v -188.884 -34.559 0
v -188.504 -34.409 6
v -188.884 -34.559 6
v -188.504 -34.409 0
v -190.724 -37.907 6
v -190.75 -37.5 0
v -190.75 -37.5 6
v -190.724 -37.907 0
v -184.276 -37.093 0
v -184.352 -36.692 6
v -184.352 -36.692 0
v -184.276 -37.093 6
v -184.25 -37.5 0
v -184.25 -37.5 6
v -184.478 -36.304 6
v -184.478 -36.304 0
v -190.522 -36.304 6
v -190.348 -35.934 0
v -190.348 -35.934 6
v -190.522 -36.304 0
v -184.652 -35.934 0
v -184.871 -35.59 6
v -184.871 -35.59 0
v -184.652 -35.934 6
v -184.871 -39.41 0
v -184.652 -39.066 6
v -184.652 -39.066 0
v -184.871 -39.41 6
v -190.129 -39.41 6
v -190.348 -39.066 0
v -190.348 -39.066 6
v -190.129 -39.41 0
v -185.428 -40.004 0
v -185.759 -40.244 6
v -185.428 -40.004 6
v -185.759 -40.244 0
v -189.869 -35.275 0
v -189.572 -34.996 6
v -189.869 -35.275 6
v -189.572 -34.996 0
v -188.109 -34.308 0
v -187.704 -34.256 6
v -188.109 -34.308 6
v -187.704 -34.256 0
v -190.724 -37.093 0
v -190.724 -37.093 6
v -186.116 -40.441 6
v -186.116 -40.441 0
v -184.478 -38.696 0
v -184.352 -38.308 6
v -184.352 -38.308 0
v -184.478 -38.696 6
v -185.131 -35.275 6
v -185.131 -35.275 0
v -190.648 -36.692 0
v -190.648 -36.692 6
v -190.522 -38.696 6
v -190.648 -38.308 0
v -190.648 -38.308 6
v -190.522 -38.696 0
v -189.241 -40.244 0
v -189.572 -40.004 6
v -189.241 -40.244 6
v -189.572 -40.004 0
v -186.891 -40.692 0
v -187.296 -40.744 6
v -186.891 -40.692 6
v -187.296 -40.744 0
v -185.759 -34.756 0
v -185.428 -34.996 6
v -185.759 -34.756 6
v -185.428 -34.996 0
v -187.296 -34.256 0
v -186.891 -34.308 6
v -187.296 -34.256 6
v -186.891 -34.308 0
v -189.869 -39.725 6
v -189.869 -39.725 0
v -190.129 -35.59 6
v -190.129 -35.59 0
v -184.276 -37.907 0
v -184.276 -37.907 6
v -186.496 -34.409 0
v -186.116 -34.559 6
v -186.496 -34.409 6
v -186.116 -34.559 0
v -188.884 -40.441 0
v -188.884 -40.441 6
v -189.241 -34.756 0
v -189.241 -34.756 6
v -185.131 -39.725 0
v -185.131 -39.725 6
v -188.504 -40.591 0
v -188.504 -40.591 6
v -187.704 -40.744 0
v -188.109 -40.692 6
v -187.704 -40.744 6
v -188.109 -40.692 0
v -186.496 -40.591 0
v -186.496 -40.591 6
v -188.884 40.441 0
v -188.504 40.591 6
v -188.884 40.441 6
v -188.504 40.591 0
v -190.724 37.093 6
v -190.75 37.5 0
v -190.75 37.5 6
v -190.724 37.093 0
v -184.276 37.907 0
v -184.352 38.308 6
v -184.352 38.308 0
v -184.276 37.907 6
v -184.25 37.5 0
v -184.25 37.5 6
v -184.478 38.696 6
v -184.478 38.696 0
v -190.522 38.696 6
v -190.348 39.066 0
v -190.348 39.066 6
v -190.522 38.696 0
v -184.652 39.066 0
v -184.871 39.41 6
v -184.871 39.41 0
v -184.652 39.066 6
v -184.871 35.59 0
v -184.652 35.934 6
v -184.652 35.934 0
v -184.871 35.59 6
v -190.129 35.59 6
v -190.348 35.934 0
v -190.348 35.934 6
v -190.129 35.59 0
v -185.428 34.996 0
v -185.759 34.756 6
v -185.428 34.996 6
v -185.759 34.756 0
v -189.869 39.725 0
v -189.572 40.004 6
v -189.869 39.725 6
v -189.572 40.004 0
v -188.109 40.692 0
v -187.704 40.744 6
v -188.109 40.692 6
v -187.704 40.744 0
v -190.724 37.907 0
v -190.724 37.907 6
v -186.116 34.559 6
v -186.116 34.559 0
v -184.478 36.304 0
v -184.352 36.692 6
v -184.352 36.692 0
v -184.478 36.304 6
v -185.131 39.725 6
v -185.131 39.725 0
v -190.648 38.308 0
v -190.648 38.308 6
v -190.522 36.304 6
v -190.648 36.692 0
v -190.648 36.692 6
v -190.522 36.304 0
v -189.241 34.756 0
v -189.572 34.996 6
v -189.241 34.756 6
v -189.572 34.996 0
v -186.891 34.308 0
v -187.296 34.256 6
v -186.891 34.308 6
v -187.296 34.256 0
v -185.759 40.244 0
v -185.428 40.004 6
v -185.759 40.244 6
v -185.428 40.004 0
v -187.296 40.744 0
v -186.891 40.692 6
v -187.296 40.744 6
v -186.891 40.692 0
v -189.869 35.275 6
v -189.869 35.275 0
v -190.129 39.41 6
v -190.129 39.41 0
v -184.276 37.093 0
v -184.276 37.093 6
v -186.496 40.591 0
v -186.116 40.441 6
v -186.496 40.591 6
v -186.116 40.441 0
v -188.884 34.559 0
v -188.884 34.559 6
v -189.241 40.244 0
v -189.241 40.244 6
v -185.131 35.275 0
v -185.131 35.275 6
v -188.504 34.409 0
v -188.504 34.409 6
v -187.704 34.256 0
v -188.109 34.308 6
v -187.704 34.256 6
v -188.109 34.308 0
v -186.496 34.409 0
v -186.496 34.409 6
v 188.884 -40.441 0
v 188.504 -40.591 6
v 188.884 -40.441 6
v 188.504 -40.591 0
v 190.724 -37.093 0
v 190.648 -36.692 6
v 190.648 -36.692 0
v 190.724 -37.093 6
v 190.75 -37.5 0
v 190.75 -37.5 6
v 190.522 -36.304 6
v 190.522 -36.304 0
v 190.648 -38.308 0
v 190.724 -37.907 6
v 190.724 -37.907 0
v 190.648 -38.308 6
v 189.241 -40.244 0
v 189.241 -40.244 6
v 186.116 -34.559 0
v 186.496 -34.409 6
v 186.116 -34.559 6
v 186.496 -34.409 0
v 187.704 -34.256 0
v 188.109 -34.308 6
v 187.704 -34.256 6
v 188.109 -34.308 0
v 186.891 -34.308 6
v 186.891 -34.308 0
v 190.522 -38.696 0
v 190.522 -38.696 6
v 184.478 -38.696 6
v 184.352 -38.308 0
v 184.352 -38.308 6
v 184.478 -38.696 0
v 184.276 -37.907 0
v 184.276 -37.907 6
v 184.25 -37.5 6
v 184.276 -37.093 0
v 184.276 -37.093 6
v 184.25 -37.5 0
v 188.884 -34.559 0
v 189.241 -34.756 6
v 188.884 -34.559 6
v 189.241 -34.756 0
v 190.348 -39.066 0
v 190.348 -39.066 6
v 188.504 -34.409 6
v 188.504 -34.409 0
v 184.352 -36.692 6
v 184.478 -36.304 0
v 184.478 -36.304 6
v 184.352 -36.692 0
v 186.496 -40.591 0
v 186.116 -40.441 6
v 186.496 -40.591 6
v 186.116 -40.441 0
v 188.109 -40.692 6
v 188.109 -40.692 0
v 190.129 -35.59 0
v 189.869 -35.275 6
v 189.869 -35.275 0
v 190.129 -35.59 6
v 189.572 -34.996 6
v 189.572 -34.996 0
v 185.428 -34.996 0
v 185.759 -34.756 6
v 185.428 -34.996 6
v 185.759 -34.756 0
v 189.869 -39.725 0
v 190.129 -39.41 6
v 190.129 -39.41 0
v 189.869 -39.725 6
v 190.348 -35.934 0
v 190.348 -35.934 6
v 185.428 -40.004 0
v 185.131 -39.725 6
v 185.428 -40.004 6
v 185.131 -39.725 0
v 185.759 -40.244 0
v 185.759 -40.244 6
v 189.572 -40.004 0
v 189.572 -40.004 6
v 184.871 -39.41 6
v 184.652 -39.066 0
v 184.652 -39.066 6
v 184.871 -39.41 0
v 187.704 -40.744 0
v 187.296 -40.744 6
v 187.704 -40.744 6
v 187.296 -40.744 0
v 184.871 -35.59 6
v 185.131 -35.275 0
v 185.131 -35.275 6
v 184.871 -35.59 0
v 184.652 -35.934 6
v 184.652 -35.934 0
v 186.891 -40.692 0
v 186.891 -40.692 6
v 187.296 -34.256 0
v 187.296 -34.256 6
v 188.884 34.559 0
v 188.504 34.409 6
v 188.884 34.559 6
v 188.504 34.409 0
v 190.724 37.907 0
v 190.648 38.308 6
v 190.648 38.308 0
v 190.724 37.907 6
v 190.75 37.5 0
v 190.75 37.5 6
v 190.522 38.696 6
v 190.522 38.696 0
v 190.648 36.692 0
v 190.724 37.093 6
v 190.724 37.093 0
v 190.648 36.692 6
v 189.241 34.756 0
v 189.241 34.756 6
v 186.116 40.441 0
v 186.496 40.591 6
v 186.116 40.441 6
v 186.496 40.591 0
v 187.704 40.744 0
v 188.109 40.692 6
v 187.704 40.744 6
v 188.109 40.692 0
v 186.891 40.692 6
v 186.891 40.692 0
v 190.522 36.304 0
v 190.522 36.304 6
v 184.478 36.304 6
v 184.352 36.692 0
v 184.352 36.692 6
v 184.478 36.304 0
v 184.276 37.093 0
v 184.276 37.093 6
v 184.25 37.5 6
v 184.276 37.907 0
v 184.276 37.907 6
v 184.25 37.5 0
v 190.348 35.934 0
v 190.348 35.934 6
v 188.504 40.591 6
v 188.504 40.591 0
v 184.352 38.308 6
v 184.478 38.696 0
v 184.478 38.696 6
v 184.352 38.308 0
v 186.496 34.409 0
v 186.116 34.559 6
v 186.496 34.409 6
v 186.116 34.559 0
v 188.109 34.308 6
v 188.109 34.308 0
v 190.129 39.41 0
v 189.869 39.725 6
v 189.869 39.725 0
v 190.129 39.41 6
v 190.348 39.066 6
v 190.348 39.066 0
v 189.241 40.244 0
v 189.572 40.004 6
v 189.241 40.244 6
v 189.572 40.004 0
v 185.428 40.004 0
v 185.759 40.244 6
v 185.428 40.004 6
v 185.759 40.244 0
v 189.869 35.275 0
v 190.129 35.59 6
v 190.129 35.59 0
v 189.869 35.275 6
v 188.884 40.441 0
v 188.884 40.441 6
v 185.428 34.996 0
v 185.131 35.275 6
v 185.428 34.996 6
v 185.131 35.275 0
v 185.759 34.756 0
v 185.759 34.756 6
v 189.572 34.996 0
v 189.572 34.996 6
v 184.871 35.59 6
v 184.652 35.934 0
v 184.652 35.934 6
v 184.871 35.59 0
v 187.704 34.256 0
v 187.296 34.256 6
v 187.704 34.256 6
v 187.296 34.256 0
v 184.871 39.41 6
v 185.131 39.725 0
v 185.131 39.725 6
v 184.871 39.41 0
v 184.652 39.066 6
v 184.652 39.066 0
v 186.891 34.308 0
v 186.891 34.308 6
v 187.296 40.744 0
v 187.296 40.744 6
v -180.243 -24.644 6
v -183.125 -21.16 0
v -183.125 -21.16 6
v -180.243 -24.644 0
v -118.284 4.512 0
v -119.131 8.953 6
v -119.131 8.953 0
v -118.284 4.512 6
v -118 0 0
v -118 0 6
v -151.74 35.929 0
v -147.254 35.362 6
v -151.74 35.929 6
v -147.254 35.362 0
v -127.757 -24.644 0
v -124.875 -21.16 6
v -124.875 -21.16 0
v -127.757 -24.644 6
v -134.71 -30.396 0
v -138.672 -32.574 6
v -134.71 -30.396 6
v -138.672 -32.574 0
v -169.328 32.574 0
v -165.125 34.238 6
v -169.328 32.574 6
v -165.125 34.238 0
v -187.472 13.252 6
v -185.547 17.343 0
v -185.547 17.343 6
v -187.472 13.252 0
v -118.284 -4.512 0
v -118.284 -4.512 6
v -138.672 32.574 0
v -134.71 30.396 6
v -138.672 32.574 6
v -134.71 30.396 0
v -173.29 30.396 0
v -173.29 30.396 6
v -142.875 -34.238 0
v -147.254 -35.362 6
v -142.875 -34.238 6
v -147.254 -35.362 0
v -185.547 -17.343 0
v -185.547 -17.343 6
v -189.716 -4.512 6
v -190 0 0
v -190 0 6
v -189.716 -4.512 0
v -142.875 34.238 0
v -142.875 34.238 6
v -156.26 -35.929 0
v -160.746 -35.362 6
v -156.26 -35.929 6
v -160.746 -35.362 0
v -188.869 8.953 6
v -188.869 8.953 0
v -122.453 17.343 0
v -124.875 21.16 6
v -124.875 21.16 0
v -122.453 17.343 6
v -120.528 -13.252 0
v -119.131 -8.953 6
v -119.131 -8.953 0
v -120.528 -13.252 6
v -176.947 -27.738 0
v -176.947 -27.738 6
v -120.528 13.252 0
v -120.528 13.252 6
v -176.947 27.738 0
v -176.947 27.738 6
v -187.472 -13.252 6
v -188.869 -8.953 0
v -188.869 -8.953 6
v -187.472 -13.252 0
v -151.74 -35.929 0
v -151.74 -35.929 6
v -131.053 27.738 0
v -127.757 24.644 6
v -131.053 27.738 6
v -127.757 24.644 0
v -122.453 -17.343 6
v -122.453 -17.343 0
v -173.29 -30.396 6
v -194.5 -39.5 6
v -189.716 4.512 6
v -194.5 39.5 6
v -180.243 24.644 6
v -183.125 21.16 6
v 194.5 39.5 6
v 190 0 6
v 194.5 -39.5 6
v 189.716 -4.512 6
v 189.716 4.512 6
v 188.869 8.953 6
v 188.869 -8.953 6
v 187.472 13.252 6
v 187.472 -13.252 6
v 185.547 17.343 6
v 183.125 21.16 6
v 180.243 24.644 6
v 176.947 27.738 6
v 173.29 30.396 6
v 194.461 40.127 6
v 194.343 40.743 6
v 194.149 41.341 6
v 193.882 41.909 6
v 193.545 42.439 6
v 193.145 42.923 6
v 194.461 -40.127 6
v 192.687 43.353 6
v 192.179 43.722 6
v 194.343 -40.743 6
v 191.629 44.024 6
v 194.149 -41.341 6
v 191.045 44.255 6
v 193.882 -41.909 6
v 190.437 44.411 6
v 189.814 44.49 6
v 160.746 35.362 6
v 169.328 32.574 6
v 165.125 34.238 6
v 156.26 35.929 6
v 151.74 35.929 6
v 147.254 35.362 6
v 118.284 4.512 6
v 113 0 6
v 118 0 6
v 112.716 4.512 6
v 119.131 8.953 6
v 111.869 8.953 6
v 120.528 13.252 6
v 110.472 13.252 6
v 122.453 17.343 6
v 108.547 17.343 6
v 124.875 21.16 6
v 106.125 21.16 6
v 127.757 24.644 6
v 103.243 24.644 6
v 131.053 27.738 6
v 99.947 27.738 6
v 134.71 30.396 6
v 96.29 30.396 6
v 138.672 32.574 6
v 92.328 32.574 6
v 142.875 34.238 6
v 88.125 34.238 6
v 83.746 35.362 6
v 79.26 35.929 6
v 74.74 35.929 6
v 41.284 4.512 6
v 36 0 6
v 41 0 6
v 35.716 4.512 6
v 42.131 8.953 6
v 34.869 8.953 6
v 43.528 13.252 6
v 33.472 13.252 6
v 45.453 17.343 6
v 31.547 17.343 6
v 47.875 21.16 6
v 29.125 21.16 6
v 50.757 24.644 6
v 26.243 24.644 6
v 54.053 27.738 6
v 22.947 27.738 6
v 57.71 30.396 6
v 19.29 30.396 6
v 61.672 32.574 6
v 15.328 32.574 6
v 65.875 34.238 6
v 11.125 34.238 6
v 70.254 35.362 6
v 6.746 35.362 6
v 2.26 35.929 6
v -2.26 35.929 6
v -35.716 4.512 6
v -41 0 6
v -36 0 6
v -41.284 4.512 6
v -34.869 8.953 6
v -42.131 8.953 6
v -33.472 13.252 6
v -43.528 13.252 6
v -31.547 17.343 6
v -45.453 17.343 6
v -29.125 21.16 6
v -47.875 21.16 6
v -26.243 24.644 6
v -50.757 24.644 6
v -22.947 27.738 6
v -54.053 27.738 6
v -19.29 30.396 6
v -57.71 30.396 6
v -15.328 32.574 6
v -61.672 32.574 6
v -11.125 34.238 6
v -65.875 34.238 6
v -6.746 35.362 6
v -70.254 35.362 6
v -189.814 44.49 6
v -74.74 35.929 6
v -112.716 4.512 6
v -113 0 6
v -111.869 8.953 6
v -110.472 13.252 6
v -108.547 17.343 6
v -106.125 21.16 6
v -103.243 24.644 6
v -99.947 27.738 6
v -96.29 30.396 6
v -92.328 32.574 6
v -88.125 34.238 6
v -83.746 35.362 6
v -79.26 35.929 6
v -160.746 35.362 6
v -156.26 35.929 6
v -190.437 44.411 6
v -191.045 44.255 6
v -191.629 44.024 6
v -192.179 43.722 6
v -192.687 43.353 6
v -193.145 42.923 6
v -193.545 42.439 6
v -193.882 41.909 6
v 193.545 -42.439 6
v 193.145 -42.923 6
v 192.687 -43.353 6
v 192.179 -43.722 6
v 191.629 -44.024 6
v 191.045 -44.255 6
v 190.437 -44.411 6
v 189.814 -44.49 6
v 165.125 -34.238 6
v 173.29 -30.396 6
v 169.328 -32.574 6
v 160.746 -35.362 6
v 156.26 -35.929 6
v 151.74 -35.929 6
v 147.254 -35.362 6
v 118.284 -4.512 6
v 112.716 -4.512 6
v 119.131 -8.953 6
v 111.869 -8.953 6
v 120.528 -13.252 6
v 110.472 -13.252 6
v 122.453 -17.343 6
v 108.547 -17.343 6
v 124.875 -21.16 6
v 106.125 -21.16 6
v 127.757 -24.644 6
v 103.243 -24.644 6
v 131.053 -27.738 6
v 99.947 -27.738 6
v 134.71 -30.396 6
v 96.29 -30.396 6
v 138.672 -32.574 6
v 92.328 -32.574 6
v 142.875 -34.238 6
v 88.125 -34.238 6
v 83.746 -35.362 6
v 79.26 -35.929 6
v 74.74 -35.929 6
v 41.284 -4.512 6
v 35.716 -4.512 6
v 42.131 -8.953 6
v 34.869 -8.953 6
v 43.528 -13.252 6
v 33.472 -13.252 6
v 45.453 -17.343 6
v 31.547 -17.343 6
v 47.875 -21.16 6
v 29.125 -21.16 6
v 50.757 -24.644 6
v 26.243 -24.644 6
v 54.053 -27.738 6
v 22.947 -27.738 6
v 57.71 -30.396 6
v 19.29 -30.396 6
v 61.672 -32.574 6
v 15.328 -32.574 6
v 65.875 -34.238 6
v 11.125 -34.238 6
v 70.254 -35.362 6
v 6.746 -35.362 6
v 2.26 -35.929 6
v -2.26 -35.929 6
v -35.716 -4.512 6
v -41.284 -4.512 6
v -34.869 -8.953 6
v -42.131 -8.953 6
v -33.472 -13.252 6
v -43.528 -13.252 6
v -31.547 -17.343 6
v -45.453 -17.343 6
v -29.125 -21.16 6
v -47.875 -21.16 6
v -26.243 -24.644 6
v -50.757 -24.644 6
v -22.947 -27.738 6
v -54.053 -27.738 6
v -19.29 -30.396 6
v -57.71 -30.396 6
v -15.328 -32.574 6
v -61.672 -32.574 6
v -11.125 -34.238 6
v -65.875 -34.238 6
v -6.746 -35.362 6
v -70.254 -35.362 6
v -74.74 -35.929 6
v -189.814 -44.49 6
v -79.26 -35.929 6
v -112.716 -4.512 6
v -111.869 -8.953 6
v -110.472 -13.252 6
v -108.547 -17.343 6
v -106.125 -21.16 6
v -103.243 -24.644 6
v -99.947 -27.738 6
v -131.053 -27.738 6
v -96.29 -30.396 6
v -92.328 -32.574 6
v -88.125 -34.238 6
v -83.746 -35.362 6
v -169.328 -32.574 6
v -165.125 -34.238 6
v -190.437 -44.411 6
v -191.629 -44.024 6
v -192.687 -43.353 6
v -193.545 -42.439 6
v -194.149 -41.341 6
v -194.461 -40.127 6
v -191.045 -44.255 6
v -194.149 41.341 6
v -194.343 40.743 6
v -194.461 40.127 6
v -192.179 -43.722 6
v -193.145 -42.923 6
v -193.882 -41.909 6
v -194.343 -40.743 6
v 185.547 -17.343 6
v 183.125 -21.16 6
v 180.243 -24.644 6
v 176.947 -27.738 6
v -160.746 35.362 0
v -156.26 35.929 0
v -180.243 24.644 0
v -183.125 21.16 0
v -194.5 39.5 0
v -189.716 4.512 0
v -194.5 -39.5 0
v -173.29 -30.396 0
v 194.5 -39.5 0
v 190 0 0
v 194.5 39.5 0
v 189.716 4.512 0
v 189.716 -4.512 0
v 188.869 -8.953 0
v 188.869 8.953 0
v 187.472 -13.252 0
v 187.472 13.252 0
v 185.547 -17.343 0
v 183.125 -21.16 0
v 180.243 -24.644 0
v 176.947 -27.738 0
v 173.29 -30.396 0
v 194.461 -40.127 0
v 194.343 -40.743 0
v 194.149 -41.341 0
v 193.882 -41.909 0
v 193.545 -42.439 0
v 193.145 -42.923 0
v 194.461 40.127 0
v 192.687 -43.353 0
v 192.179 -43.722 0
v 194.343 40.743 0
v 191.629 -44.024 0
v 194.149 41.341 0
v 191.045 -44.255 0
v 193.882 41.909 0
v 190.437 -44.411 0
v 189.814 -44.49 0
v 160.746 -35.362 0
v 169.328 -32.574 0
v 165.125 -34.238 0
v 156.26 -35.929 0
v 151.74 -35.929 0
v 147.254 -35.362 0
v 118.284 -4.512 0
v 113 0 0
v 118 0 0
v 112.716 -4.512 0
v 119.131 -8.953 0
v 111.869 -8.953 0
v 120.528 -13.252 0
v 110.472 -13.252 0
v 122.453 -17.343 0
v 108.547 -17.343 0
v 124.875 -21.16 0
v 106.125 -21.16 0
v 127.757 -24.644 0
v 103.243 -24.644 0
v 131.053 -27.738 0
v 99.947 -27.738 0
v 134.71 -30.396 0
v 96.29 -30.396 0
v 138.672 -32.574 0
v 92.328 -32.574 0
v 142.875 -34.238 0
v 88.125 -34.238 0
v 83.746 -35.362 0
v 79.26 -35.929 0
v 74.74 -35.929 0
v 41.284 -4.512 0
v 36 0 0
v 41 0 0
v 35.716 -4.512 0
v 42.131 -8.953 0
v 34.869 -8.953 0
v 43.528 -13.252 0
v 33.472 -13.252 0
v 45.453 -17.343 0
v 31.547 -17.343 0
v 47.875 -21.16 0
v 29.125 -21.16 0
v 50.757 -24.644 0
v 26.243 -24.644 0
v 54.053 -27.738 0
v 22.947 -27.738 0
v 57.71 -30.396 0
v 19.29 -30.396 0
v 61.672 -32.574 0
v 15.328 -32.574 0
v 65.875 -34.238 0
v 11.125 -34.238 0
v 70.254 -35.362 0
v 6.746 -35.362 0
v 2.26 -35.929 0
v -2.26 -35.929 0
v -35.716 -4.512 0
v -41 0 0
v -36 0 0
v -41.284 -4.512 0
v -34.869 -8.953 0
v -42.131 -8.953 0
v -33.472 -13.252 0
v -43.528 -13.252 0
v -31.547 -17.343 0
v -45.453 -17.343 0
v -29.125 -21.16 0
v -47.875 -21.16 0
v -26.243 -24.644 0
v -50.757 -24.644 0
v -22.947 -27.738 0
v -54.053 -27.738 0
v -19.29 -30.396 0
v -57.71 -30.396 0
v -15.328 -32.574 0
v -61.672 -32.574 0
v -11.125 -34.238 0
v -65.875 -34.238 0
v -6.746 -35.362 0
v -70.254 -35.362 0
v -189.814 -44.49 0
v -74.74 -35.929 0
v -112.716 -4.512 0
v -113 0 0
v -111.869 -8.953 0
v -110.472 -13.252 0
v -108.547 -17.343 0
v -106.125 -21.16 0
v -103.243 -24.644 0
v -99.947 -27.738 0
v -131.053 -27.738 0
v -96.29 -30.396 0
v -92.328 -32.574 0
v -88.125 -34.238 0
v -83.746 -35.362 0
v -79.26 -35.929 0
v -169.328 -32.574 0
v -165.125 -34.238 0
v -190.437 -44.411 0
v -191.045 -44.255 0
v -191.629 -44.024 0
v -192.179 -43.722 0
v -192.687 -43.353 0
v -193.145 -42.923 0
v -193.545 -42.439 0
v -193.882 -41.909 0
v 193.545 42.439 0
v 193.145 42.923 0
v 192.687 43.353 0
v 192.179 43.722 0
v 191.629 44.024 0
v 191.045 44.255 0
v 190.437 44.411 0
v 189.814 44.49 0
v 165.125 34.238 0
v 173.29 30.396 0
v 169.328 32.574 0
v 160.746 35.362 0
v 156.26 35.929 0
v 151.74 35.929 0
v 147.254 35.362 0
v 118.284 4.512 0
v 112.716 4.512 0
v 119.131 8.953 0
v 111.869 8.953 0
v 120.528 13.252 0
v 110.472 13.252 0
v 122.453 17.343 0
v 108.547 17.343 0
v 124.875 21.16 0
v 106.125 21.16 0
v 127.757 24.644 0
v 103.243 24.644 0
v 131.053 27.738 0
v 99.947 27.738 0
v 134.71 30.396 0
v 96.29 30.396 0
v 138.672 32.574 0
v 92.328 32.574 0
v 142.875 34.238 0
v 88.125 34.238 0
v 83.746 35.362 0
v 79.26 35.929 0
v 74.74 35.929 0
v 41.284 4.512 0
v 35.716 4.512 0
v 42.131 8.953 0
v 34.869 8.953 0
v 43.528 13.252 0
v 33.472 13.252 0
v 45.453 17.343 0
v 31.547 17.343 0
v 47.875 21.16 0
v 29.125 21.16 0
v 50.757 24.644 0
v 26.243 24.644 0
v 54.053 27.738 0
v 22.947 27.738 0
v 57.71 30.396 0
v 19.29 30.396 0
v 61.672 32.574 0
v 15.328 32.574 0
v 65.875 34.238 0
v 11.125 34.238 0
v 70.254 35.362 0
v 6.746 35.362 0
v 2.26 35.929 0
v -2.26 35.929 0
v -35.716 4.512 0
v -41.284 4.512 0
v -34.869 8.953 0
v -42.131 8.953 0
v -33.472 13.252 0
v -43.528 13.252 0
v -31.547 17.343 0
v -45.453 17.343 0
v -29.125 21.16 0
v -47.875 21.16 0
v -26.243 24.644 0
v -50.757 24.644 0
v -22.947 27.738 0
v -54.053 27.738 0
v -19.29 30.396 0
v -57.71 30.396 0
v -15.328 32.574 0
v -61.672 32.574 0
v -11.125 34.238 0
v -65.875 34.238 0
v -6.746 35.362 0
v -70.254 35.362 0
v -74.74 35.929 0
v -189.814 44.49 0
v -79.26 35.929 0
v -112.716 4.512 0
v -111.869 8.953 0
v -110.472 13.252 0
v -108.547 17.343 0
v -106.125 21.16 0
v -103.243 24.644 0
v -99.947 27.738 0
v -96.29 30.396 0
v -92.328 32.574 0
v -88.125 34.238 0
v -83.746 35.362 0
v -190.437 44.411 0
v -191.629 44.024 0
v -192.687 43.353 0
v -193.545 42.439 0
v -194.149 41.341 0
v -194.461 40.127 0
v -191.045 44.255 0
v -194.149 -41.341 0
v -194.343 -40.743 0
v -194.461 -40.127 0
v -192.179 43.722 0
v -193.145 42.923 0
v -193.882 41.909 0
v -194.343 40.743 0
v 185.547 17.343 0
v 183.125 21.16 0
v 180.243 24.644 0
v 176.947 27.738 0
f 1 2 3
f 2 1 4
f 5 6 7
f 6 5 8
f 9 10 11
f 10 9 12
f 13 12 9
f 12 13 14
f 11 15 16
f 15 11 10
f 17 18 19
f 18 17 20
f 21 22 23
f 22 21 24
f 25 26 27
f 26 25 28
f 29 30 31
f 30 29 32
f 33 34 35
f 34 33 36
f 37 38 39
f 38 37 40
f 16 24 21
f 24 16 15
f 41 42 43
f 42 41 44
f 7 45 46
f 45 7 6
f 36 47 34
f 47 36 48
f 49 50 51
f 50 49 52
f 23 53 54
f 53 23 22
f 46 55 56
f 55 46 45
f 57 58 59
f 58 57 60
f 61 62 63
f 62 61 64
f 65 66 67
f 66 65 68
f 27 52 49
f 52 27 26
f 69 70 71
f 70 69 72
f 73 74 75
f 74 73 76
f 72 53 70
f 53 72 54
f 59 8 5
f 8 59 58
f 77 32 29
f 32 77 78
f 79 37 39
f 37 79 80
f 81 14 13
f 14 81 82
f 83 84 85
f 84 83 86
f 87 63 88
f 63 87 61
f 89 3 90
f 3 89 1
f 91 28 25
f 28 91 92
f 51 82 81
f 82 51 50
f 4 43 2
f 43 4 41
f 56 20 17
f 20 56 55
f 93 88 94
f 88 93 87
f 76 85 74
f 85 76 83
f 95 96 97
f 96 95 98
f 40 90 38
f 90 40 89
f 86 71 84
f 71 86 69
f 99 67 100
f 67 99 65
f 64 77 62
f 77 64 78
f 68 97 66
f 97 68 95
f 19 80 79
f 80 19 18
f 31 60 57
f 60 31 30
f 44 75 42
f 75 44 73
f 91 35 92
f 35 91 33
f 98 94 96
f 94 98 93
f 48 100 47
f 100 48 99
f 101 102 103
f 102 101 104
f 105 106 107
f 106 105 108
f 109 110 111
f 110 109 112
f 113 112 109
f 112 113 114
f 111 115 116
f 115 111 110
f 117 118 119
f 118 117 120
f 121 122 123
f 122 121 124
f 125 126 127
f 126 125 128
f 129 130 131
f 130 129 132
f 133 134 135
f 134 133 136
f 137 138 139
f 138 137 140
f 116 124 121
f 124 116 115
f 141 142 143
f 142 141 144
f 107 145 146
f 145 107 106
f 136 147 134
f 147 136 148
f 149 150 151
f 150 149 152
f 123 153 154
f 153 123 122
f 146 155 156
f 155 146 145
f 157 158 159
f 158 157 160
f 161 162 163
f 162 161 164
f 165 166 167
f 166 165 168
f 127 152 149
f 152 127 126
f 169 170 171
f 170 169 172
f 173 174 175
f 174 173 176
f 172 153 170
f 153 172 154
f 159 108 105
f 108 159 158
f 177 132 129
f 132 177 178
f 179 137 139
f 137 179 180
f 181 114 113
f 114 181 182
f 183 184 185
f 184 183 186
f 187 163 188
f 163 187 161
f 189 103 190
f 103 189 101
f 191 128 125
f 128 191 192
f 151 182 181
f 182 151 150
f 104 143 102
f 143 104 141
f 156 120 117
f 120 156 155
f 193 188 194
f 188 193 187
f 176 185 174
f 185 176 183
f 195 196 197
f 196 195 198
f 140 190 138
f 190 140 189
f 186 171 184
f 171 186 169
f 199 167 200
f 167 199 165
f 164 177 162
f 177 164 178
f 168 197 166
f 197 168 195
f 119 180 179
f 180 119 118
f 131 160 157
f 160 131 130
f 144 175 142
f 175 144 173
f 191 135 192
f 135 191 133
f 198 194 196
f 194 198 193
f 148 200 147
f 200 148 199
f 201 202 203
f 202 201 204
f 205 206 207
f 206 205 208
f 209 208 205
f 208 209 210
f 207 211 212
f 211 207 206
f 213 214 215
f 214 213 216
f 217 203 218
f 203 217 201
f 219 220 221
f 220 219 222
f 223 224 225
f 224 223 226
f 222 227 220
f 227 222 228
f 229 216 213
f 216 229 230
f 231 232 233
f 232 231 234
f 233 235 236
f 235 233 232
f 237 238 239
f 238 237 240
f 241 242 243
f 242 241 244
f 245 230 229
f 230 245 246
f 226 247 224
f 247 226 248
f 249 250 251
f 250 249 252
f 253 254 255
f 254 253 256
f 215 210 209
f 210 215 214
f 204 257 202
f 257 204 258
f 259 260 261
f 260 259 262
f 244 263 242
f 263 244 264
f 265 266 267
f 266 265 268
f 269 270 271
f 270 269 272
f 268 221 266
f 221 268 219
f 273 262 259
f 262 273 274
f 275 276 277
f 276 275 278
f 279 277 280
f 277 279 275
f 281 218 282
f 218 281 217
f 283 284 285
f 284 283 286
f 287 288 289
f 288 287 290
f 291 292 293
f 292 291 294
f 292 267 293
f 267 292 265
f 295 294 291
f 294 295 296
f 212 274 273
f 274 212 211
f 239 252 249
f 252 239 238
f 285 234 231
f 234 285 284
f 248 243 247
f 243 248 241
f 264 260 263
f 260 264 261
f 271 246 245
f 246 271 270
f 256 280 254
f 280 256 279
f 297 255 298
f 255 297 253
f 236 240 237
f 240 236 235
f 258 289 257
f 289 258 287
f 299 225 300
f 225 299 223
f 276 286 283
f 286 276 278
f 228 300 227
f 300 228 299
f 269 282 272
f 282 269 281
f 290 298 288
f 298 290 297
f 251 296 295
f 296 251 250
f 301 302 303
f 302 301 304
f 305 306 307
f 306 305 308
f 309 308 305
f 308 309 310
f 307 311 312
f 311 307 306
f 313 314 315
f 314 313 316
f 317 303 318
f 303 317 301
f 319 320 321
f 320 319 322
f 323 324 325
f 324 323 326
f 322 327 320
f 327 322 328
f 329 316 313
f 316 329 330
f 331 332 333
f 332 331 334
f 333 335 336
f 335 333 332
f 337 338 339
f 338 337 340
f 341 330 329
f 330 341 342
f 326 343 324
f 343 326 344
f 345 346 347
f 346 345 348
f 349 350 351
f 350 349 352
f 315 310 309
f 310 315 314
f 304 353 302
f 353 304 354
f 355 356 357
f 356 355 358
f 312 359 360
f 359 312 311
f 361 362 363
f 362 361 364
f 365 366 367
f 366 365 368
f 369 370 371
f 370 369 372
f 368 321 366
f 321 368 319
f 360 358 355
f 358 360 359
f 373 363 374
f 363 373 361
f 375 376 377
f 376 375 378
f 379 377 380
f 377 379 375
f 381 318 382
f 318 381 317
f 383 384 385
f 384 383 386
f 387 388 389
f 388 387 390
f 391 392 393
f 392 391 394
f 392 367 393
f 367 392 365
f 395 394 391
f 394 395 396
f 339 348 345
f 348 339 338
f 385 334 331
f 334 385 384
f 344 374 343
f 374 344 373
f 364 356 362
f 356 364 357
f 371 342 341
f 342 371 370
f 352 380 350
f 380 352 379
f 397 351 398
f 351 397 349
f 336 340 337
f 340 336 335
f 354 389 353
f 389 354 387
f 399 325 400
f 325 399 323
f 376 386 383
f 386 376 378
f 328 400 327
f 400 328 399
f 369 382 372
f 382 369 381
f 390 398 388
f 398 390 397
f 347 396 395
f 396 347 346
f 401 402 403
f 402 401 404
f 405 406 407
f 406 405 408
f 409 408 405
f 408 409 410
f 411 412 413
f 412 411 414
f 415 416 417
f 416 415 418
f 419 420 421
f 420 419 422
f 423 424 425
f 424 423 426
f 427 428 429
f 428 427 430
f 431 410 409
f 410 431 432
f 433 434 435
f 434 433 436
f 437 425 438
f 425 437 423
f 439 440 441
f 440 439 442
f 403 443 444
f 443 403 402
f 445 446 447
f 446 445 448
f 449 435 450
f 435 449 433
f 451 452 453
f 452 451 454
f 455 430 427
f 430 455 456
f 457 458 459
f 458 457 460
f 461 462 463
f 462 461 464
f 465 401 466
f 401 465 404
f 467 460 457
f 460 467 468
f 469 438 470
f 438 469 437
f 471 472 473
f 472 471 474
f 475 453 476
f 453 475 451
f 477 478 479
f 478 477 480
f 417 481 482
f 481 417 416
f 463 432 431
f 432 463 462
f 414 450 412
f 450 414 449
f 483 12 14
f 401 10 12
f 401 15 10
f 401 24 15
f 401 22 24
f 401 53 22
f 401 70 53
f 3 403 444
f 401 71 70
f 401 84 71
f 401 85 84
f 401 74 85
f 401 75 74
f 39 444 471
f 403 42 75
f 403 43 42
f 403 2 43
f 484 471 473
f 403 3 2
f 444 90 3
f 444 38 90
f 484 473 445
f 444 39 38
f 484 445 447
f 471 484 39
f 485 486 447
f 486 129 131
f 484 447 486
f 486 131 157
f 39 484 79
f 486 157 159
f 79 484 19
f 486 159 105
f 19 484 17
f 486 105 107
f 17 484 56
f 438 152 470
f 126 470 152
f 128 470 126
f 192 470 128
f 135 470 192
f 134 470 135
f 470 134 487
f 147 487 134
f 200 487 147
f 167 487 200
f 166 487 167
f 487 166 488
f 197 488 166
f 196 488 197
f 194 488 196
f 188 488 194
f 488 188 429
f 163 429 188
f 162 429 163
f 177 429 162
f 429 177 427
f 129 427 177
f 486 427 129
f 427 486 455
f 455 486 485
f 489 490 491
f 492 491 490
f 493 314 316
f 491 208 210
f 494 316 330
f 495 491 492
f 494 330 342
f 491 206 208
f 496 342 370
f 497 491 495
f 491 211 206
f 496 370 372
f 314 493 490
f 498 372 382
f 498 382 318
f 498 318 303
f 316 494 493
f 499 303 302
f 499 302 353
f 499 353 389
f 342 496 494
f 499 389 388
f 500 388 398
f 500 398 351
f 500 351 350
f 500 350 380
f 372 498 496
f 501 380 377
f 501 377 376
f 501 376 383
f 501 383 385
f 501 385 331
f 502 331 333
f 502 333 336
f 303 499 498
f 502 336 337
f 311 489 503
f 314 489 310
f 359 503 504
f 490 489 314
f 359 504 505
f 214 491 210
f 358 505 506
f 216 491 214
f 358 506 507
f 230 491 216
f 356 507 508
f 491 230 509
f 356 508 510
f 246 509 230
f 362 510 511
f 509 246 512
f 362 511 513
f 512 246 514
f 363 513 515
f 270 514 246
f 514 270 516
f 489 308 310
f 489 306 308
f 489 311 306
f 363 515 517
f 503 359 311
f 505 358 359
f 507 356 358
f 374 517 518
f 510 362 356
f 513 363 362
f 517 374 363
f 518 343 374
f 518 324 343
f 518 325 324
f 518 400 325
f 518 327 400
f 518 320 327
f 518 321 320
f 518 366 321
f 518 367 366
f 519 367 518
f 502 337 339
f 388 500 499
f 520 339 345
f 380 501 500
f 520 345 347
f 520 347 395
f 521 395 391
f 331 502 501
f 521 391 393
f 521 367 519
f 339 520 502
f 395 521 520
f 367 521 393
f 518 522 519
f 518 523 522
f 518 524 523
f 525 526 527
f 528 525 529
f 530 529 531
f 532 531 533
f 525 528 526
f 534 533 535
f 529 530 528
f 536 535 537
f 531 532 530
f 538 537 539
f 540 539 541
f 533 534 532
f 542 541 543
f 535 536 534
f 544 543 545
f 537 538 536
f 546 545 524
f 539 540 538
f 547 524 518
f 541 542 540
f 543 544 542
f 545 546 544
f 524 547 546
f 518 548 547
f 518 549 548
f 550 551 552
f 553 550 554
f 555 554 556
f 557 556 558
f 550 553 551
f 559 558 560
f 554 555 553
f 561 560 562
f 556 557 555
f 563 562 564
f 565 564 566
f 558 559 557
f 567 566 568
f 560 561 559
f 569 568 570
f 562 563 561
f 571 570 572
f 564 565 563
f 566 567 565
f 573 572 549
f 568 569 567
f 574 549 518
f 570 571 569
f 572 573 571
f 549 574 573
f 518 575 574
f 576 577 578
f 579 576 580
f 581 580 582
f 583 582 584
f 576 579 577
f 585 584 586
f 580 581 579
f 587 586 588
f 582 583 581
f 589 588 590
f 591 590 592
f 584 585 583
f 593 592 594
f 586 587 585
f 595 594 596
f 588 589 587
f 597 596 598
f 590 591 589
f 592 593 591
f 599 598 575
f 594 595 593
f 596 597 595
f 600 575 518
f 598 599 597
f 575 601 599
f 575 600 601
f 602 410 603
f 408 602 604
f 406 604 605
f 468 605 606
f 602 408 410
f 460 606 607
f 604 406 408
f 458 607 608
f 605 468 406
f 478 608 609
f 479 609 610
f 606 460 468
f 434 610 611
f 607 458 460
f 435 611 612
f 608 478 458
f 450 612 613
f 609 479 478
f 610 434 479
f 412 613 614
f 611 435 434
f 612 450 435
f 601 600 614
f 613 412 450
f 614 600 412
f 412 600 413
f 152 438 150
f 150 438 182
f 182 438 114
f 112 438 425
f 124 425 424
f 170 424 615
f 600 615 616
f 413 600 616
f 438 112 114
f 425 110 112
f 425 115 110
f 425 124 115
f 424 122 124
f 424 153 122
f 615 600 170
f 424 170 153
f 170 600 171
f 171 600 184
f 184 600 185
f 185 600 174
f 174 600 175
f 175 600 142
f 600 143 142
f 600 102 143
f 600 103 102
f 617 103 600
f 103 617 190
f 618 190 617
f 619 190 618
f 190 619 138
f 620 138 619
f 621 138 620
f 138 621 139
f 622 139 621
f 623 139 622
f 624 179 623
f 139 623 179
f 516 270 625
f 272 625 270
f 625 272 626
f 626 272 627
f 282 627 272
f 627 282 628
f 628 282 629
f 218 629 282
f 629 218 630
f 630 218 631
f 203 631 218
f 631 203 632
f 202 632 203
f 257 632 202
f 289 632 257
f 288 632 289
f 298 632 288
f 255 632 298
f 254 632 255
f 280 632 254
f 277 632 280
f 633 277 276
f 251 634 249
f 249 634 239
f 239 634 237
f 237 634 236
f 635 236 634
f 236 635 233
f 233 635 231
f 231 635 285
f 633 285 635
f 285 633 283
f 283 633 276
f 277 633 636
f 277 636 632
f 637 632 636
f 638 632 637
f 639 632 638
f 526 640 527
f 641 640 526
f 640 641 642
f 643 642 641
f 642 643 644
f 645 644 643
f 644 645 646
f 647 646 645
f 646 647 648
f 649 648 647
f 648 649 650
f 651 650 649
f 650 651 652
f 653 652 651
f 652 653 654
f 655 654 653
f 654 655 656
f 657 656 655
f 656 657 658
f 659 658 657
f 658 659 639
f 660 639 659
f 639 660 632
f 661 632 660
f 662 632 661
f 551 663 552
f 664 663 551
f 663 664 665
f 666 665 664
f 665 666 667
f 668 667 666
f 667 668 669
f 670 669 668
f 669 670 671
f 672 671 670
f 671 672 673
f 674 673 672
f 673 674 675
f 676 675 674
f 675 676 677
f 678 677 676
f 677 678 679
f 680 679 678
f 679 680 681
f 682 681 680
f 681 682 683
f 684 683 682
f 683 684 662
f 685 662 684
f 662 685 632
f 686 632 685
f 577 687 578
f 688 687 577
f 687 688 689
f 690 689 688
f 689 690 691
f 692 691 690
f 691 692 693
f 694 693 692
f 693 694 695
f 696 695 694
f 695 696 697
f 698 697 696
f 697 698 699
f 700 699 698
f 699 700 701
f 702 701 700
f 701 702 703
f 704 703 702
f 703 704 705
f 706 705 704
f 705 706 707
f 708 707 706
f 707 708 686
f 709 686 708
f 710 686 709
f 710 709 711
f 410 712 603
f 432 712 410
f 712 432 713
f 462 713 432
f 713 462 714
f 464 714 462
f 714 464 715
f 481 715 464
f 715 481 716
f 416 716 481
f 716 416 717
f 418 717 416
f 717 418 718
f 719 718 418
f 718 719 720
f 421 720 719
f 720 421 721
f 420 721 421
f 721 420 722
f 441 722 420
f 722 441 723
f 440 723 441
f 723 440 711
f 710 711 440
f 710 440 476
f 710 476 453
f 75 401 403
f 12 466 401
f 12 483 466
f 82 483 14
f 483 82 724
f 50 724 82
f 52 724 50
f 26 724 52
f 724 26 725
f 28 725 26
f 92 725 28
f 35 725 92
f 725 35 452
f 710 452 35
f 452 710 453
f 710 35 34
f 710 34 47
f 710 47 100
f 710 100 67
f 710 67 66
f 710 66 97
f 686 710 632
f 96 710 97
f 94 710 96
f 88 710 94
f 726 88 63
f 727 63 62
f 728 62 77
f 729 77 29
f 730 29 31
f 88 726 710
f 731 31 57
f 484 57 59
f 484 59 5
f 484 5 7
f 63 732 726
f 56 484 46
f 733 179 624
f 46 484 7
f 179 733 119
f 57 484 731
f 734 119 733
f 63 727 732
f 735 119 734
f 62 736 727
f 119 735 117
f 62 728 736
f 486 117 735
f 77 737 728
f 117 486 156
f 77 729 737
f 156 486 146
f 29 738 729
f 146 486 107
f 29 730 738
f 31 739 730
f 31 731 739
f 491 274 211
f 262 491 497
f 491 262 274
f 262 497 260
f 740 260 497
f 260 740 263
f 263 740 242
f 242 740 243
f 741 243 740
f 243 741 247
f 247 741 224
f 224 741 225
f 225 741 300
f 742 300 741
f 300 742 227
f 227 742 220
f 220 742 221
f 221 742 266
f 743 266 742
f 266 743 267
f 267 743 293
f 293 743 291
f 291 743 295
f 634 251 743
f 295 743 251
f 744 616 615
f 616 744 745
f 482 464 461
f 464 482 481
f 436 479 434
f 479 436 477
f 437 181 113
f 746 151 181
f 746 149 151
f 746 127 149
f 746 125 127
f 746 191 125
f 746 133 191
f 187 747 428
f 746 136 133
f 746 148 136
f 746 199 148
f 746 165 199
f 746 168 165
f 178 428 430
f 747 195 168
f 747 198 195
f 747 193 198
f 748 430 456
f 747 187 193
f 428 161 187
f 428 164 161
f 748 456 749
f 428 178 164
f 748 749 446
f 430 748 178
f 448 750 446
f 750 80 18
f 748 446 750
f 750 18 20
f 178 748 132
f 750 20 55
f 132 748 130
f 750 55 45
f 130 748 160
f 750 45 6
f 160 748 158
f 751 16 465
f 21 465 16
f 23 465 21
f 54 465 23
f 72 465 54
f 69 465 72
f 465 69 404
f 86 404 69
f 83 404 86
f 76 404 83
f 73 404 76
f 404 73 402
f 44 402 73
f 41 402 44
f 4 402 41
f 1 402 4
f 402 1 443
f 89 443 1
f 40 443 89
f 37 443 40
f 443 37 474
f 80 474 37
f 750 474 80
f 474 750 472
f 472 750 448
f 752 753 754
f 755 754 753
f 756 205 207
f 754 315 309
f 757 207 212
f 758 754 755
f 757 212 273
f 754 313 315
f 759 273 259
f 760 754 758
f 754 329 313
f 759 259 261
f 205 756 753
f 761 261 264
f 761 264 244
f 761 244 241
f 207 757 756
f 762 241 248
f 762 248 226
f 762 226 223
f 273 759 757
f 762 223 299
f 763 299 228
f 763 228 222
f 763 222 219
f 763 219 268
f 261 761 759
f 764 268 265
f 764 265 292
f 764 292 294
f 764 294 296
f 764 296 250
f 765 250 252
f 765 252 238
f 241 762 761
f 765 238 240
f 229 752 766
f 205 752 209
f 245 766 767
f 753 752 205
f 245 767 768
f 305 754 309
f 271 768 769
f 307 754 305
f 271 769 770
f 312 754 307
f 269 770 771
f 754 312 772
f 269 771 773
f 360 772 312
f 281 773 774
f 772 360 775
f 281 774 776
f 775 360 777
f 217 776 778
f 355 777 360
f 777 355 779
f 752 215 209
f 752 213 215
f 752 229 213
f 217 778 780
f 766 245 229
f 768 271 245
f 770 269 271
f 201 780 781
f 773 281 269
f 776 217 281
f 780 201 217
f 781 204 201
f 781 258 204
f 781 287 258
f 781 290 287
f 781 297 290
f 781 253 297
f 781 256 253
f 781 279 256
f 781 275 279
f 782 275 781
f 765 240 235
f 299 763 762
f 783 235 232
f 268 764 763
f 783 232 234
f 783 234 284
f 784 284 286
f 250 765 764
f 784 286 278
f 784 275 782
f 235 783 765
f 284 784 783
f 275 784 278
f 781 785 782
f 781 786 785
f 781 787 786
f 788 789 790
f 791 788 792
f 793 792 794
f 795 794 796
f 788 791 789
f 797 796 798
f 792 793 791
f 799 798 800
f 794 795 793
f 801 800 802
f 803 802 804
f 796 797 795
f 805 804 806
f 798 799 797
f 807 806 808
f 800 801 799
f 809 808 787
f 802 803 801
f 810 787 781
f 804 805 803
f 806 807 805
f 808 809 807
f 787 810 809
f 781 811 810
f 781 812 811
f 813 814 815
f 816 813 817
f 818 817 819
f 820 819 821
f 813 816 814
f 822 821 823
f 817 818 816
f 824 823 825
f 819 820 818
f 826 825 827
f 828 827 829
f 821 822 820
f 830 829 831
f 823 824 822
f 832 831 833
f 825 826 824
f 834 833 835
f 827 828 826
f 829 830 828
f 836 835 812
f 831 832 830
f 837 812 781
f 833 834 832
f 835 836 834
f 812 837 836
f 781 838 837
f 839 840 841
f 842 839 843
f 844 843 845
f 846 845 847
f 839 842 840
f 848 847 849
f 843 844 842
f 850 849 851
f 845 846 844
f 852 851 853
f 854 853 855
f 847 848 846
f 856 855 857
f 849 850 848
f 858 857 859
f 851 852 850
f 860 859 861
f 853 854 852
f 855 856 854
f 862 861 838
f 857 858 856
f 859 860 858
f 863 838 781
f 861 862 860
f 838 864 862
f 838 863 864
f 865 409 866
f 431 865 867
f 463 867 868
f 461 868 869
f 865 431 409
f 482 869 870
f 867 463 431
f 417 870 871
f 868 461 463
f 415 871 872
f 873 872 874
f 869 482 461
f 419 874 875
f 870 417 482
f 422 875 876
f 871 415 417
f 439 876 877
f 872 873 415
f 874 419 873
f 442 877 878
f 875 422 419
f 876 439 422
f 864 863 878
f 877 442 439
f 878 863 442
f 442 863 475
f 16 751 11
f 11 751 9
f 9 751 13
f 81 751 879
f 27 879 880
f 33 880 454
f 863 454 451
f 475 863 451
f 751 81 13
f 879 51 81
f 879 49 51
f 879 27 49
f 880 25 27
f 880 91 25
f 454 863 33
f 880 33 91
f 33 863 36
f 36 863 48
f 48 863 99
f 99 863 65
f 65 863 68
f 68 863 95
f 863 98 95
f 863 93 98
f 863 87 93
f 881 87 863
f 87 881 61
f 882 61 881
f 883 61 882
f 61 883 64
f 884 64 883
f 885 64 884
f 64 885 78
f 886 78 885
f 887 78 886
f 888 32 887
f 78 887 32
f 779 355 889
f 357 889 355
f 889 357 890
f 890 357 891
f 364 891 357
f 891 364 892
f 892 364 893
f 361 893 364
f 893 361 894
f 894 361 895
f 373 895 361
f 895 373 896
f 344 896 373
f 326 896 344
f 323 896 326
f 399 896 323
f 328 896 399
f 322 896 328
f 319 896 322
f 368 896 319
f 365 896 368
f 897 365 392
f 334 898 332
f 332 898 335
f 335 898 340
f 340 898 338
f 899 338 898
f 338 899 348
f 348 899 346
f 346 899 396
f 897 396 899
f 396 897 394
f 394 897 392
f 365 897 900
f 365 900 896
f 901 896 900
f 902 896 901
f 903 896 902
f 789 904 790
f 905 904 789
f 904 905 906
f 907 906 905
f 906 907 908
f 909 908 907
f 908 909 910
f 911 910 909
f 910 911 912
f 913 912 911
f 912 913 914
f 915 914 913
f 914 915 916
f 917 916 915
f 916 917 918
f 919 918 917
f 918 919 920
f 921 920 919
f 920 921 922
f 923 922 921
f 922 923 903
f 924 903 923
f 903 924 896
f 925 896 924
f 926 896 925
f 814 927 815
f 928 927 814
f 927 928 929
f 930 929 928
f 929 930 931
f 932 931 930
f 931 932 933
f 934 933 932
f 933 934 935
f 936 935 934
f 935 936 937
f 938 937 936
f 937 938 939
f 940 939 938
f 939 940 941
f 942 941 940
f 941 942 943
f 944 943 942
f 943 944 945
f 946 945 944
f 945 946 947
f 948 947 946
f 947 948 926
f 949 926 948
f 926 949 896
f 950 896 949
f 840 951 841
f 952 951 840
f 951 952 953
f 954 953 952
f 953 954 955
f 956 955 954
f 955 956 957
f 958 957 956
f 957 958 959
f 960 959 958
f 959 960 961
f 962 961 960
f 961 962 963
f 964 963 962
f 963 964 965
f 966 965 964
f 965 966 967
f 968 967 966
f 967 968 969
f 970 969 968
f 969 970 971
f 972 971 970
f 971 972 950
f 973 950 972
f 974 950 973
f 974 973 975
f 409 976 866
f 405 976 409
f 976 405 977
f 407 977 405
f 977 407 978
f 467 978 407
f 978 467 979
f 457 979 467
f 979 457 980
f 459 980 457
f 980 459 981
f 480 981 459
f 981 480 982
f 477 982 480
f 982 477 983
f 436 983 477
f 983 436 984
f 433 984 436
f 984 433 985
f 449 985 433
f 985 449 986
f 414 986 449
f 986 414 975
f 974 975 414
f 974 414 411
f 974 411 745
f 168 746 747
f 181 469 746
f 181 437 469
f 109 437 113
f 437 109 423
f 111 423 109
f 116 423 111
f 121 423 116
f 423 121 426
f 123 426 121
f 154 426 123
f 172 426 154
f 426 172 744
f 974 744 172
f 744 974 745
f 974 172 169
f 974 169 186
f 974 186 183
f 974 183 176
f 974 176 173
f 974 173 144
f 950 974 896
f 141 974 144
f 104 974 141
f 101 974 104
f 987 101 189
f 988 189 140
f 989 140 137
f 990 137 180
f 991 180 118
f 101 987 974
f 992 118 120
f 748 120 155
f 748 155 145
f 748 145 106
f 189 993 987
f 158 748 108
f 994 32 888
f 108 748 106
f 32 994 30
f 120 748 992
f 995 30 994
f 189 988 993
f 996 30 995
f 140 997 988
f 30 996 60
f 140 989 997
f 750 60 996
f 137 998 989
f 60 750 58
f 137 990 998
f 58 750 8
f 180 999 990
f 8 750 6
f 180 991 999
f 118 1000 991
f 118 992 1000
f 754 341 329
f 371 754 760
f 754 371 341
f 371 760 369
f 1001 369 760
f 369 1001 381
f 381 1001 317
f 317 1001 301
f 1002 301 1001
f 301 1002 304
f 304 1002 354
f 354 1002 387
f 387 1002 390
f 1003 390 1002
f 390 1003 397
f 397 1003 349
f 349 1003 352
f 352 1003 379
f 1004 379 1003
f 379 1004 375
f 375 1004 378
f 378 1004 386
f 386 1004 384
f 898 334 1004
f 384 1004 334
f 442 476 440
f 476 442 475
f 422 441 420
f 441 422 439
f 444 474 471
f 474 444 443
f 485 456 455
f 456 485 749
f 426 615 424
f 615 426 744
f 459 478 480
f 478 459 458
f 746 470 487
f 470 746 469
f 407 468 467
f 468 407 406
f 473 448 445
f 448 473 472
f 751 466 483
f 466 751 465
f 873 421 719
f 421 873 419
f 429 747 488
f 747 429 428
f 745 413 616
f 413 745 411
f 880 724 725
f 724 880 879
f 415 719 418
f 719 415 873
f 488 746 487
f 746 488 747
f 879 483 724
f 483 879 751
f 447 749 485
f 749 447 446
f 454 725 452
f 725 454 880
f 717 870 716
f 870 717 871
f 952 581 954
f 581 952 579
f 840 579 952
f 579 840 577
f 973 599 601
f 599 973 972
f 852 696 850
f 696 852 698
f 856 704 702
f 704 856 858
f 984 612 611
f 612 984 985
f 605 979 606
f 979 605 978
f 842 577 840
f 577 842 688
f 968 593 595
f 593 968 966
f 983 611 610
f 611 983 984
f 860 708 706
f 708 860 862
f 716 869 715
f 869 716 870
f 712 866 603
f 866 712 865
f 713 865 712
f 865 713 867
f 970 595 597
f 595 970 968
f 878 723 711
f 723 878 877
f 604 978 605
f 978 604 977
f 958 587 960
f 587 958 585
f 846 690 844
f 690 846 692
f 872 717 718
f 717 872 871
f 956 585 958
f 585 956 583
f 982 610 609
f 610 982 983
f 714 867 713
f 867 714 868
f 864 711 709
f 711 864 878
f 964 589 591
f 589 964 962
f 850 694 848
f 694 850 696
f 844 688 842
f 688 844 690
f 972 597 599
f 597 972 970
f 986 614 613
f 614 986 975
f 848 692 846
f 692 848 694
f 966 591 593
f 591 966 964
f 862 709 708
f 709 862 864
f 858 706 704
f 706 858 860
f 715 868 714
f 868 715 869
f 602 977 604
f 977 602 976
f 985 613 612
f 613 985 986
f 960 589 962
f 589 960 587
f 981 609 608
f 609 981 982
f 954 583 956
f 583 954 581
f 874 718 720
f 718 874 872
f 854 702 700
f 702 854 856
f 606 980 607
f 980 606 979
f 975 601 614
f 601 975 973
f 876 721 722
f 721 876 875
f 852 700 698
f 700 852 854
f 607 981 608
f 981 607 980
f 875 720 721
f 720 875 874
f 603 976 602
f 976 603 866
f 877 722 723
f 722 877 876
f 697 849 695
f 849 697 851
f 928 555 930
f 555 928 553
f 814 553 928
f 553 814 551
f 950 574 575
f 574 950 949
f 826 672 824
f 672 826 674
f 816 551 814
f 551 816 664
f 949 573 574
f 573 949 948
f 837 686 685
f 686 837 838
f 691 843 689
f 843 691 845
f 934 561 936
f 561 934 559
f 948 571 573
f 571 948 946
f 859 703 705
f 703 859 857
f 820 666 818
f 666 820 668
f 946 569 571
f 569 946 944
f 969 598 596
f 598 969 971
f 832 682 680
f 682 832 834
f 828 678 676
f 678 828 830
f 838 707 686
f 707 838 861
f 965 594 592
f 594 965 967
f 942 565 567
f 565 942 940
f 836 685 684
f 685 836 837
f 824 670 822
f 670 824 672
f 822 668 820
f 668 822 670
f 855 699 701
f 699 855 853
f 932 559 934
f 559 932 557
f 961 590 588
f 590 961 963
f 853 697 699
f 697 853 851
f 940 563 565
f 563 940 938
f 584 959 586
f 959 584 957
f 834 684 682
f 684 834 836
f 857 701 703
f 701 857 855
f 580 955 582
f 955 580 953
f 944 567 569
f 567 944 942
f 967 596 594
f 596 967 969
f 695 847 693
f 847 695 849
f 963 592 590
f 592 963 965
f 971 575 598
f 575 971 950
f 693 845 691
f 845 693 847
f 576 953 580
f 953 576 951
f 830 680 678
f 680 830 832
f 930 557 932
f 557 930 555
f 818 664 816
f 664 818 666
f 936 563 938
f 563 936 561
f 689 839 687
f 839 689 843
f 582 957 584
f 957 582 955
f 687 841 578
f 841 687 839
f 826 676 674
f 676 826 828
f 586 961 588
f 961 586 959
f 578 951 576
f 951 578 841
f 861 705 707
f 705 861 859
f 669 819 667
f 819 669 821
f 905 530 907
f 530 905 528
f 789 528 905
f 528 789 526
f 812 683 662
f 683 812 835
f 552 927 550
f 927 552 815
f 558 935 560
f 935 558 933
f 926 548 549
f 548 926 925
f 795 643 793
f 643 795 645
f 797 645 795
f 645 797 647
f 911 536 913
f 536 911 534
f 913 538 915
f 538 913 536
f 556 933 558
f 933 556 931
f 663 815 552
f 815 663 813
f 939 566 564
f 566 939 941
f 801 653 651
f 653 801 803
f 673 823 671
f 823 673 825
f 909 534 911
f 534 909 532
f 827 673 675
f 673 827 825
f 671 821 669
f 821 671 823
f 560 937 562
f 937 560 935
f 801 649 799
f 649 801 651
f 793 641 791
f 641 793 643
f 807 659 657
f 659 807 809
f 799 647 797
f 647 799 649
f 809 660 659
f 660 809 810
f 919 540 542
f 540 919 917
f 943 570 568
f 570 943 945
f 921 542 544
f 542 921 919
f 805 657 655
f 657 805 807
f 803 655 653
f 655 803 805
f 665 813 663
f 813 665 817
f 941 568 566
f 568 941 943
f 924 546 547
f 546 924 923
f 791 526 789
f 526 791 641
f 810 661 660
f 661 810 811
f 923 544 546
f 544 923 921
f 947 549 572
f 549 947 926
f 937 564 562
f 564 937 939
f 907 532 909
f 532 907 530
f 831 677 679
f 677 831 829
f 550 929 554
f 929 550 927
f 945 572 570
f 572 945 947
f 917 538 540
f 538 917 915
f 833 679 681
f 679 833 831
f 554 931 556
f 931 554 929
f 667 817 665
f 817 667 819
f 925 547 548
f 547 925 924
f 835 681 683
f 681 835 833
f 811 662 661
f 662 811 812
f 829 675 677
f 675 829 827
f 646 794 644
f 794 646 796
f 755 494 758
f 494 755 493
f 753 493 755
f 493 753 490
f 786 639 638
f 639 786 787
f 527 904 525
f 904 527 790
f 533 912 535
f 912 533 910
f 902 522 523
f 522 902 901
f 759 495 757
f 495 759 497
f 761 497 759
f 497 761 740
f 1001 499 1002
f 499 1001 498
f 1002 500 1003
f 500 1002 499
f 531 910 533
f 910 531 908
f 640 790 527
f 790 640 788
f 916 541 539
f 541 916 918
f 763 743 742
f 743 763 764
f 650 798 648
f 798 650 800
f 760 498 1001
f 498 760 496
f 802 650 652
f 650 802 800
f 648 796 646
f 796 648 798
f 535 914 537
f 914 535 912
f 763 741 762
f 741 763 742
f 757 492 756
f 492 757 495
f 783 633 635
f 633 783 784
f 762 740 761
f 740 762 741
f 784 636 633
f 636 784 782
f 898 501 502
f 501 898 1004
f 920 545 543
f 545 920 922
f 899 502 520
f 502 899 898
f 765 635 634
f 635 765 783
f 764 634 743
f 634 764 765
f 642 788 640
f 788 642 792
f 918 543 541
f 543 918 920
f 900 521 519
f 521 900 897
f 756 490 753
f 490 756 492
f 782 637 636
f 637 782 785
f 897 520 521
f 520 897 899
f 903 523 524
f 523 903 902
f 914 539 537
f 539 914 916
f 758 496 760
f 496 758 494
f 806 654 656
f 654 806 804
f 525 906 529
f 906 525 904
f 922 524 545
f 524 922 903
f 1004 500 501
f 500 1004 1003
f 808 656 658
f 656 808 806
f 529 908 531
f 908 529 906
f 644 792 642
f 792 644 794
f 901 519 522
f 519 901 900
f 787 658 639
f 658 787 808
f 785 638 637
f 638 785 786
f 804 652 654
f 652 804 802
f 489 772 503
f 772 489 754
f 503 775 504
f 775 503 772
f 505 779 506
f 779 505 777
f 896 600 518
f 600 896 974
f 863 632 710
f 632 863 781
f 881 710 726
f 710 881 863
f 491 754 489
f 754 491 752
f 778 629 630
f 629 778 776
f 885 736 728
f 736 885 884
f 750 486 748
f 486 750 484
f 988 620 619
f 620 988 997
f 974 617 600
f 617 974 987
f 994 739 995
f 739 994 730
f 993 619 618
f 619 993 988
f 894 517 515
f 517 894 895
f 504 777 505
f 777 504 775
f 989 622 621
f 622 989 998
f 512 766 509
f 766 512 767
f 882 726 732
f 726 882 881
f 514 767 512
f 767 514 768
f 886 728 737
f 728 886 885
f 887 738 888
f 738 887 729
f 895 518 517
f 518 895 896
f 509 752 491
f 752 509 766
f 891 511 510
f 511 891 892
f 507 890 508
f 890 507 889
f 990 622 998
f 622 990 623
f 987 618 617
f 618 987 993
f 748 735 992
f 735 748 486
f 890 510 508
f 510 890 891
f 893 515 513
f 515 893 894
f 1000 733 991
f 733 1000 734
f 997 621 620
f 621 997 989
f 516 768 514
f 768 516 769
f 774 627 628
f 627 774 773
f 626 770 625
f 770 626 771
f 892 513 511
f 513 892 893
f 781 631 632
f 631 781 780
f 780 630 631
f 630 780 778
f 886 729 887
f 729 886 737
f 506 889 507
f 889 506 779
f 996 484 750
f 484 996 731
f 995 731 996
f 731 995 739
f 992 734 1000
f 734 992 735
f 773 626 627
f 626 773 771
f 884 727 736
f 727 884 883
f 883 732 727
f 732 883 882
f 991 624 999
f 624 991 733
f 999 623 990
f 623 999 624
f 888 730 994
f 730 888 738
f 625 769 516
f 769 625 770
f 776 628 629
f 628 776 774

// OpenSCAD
$fn = 50;


difference() {
	union() {
		hull() {
			translate(v = [-189.5000000000, 39.5000000000, 0]) {
				cylinder(h = 6, r = 5);
			}
			translate(v = [189.5000000000, 39.5000000000, 0]) {
				cylinder(h = 6, r = 5);
			}
			translate(v = [-189.5000000000, -39.5000000000, 0]) {
				cylinder(h = 6, r = 5);
			}
			translate(v = [189.5000000000, -39.5000000000, 0]) {
				cylinder(h = 6, r = 5);
			}
		}
	}
	union() {
		#translate(v = [-187.5000000000, -37.5000000000, -100.0000000000]) {
			cylinder(h = 200, r = 3.2500000000);
		}
		#translate(v = [-187.5000000000, 37.5000000000, -100.0000000000]) {
			cylinder(h = 200, r = 3.2500000000);
		}
		#translate(v = [187.5000000000, -37.5000000000, -100.0000000000]) {
			cylinder(h = 200, r = 3.2500000000);
		}
		#translate(v = [187.5000000000, 37.5000000000, -100.0000000000]) {
			cylinder(h = 200, r = 3.2500000000);
		}
		#translate(v = [-154.0000000000, 0, 0]) {
			cylinder(h = 6, r = 36.0000000000);
		}
		#translate(v = [-77.0000000000, 0, 0]) {
			cylinder(h = 6, r = 36.0000000000);
		}
		#cylinder(h = 6, r = 36.0000000000);
		#translate(v = [77.0000000000, 0, 0]) {
			cylinder(h = 6, r = 36.0000000000);
		}
		#translate(v = [154.0000000000, 0, 0]) {
			cylinder(h = 6, r = 36.0000000000);
		}
	}
}
